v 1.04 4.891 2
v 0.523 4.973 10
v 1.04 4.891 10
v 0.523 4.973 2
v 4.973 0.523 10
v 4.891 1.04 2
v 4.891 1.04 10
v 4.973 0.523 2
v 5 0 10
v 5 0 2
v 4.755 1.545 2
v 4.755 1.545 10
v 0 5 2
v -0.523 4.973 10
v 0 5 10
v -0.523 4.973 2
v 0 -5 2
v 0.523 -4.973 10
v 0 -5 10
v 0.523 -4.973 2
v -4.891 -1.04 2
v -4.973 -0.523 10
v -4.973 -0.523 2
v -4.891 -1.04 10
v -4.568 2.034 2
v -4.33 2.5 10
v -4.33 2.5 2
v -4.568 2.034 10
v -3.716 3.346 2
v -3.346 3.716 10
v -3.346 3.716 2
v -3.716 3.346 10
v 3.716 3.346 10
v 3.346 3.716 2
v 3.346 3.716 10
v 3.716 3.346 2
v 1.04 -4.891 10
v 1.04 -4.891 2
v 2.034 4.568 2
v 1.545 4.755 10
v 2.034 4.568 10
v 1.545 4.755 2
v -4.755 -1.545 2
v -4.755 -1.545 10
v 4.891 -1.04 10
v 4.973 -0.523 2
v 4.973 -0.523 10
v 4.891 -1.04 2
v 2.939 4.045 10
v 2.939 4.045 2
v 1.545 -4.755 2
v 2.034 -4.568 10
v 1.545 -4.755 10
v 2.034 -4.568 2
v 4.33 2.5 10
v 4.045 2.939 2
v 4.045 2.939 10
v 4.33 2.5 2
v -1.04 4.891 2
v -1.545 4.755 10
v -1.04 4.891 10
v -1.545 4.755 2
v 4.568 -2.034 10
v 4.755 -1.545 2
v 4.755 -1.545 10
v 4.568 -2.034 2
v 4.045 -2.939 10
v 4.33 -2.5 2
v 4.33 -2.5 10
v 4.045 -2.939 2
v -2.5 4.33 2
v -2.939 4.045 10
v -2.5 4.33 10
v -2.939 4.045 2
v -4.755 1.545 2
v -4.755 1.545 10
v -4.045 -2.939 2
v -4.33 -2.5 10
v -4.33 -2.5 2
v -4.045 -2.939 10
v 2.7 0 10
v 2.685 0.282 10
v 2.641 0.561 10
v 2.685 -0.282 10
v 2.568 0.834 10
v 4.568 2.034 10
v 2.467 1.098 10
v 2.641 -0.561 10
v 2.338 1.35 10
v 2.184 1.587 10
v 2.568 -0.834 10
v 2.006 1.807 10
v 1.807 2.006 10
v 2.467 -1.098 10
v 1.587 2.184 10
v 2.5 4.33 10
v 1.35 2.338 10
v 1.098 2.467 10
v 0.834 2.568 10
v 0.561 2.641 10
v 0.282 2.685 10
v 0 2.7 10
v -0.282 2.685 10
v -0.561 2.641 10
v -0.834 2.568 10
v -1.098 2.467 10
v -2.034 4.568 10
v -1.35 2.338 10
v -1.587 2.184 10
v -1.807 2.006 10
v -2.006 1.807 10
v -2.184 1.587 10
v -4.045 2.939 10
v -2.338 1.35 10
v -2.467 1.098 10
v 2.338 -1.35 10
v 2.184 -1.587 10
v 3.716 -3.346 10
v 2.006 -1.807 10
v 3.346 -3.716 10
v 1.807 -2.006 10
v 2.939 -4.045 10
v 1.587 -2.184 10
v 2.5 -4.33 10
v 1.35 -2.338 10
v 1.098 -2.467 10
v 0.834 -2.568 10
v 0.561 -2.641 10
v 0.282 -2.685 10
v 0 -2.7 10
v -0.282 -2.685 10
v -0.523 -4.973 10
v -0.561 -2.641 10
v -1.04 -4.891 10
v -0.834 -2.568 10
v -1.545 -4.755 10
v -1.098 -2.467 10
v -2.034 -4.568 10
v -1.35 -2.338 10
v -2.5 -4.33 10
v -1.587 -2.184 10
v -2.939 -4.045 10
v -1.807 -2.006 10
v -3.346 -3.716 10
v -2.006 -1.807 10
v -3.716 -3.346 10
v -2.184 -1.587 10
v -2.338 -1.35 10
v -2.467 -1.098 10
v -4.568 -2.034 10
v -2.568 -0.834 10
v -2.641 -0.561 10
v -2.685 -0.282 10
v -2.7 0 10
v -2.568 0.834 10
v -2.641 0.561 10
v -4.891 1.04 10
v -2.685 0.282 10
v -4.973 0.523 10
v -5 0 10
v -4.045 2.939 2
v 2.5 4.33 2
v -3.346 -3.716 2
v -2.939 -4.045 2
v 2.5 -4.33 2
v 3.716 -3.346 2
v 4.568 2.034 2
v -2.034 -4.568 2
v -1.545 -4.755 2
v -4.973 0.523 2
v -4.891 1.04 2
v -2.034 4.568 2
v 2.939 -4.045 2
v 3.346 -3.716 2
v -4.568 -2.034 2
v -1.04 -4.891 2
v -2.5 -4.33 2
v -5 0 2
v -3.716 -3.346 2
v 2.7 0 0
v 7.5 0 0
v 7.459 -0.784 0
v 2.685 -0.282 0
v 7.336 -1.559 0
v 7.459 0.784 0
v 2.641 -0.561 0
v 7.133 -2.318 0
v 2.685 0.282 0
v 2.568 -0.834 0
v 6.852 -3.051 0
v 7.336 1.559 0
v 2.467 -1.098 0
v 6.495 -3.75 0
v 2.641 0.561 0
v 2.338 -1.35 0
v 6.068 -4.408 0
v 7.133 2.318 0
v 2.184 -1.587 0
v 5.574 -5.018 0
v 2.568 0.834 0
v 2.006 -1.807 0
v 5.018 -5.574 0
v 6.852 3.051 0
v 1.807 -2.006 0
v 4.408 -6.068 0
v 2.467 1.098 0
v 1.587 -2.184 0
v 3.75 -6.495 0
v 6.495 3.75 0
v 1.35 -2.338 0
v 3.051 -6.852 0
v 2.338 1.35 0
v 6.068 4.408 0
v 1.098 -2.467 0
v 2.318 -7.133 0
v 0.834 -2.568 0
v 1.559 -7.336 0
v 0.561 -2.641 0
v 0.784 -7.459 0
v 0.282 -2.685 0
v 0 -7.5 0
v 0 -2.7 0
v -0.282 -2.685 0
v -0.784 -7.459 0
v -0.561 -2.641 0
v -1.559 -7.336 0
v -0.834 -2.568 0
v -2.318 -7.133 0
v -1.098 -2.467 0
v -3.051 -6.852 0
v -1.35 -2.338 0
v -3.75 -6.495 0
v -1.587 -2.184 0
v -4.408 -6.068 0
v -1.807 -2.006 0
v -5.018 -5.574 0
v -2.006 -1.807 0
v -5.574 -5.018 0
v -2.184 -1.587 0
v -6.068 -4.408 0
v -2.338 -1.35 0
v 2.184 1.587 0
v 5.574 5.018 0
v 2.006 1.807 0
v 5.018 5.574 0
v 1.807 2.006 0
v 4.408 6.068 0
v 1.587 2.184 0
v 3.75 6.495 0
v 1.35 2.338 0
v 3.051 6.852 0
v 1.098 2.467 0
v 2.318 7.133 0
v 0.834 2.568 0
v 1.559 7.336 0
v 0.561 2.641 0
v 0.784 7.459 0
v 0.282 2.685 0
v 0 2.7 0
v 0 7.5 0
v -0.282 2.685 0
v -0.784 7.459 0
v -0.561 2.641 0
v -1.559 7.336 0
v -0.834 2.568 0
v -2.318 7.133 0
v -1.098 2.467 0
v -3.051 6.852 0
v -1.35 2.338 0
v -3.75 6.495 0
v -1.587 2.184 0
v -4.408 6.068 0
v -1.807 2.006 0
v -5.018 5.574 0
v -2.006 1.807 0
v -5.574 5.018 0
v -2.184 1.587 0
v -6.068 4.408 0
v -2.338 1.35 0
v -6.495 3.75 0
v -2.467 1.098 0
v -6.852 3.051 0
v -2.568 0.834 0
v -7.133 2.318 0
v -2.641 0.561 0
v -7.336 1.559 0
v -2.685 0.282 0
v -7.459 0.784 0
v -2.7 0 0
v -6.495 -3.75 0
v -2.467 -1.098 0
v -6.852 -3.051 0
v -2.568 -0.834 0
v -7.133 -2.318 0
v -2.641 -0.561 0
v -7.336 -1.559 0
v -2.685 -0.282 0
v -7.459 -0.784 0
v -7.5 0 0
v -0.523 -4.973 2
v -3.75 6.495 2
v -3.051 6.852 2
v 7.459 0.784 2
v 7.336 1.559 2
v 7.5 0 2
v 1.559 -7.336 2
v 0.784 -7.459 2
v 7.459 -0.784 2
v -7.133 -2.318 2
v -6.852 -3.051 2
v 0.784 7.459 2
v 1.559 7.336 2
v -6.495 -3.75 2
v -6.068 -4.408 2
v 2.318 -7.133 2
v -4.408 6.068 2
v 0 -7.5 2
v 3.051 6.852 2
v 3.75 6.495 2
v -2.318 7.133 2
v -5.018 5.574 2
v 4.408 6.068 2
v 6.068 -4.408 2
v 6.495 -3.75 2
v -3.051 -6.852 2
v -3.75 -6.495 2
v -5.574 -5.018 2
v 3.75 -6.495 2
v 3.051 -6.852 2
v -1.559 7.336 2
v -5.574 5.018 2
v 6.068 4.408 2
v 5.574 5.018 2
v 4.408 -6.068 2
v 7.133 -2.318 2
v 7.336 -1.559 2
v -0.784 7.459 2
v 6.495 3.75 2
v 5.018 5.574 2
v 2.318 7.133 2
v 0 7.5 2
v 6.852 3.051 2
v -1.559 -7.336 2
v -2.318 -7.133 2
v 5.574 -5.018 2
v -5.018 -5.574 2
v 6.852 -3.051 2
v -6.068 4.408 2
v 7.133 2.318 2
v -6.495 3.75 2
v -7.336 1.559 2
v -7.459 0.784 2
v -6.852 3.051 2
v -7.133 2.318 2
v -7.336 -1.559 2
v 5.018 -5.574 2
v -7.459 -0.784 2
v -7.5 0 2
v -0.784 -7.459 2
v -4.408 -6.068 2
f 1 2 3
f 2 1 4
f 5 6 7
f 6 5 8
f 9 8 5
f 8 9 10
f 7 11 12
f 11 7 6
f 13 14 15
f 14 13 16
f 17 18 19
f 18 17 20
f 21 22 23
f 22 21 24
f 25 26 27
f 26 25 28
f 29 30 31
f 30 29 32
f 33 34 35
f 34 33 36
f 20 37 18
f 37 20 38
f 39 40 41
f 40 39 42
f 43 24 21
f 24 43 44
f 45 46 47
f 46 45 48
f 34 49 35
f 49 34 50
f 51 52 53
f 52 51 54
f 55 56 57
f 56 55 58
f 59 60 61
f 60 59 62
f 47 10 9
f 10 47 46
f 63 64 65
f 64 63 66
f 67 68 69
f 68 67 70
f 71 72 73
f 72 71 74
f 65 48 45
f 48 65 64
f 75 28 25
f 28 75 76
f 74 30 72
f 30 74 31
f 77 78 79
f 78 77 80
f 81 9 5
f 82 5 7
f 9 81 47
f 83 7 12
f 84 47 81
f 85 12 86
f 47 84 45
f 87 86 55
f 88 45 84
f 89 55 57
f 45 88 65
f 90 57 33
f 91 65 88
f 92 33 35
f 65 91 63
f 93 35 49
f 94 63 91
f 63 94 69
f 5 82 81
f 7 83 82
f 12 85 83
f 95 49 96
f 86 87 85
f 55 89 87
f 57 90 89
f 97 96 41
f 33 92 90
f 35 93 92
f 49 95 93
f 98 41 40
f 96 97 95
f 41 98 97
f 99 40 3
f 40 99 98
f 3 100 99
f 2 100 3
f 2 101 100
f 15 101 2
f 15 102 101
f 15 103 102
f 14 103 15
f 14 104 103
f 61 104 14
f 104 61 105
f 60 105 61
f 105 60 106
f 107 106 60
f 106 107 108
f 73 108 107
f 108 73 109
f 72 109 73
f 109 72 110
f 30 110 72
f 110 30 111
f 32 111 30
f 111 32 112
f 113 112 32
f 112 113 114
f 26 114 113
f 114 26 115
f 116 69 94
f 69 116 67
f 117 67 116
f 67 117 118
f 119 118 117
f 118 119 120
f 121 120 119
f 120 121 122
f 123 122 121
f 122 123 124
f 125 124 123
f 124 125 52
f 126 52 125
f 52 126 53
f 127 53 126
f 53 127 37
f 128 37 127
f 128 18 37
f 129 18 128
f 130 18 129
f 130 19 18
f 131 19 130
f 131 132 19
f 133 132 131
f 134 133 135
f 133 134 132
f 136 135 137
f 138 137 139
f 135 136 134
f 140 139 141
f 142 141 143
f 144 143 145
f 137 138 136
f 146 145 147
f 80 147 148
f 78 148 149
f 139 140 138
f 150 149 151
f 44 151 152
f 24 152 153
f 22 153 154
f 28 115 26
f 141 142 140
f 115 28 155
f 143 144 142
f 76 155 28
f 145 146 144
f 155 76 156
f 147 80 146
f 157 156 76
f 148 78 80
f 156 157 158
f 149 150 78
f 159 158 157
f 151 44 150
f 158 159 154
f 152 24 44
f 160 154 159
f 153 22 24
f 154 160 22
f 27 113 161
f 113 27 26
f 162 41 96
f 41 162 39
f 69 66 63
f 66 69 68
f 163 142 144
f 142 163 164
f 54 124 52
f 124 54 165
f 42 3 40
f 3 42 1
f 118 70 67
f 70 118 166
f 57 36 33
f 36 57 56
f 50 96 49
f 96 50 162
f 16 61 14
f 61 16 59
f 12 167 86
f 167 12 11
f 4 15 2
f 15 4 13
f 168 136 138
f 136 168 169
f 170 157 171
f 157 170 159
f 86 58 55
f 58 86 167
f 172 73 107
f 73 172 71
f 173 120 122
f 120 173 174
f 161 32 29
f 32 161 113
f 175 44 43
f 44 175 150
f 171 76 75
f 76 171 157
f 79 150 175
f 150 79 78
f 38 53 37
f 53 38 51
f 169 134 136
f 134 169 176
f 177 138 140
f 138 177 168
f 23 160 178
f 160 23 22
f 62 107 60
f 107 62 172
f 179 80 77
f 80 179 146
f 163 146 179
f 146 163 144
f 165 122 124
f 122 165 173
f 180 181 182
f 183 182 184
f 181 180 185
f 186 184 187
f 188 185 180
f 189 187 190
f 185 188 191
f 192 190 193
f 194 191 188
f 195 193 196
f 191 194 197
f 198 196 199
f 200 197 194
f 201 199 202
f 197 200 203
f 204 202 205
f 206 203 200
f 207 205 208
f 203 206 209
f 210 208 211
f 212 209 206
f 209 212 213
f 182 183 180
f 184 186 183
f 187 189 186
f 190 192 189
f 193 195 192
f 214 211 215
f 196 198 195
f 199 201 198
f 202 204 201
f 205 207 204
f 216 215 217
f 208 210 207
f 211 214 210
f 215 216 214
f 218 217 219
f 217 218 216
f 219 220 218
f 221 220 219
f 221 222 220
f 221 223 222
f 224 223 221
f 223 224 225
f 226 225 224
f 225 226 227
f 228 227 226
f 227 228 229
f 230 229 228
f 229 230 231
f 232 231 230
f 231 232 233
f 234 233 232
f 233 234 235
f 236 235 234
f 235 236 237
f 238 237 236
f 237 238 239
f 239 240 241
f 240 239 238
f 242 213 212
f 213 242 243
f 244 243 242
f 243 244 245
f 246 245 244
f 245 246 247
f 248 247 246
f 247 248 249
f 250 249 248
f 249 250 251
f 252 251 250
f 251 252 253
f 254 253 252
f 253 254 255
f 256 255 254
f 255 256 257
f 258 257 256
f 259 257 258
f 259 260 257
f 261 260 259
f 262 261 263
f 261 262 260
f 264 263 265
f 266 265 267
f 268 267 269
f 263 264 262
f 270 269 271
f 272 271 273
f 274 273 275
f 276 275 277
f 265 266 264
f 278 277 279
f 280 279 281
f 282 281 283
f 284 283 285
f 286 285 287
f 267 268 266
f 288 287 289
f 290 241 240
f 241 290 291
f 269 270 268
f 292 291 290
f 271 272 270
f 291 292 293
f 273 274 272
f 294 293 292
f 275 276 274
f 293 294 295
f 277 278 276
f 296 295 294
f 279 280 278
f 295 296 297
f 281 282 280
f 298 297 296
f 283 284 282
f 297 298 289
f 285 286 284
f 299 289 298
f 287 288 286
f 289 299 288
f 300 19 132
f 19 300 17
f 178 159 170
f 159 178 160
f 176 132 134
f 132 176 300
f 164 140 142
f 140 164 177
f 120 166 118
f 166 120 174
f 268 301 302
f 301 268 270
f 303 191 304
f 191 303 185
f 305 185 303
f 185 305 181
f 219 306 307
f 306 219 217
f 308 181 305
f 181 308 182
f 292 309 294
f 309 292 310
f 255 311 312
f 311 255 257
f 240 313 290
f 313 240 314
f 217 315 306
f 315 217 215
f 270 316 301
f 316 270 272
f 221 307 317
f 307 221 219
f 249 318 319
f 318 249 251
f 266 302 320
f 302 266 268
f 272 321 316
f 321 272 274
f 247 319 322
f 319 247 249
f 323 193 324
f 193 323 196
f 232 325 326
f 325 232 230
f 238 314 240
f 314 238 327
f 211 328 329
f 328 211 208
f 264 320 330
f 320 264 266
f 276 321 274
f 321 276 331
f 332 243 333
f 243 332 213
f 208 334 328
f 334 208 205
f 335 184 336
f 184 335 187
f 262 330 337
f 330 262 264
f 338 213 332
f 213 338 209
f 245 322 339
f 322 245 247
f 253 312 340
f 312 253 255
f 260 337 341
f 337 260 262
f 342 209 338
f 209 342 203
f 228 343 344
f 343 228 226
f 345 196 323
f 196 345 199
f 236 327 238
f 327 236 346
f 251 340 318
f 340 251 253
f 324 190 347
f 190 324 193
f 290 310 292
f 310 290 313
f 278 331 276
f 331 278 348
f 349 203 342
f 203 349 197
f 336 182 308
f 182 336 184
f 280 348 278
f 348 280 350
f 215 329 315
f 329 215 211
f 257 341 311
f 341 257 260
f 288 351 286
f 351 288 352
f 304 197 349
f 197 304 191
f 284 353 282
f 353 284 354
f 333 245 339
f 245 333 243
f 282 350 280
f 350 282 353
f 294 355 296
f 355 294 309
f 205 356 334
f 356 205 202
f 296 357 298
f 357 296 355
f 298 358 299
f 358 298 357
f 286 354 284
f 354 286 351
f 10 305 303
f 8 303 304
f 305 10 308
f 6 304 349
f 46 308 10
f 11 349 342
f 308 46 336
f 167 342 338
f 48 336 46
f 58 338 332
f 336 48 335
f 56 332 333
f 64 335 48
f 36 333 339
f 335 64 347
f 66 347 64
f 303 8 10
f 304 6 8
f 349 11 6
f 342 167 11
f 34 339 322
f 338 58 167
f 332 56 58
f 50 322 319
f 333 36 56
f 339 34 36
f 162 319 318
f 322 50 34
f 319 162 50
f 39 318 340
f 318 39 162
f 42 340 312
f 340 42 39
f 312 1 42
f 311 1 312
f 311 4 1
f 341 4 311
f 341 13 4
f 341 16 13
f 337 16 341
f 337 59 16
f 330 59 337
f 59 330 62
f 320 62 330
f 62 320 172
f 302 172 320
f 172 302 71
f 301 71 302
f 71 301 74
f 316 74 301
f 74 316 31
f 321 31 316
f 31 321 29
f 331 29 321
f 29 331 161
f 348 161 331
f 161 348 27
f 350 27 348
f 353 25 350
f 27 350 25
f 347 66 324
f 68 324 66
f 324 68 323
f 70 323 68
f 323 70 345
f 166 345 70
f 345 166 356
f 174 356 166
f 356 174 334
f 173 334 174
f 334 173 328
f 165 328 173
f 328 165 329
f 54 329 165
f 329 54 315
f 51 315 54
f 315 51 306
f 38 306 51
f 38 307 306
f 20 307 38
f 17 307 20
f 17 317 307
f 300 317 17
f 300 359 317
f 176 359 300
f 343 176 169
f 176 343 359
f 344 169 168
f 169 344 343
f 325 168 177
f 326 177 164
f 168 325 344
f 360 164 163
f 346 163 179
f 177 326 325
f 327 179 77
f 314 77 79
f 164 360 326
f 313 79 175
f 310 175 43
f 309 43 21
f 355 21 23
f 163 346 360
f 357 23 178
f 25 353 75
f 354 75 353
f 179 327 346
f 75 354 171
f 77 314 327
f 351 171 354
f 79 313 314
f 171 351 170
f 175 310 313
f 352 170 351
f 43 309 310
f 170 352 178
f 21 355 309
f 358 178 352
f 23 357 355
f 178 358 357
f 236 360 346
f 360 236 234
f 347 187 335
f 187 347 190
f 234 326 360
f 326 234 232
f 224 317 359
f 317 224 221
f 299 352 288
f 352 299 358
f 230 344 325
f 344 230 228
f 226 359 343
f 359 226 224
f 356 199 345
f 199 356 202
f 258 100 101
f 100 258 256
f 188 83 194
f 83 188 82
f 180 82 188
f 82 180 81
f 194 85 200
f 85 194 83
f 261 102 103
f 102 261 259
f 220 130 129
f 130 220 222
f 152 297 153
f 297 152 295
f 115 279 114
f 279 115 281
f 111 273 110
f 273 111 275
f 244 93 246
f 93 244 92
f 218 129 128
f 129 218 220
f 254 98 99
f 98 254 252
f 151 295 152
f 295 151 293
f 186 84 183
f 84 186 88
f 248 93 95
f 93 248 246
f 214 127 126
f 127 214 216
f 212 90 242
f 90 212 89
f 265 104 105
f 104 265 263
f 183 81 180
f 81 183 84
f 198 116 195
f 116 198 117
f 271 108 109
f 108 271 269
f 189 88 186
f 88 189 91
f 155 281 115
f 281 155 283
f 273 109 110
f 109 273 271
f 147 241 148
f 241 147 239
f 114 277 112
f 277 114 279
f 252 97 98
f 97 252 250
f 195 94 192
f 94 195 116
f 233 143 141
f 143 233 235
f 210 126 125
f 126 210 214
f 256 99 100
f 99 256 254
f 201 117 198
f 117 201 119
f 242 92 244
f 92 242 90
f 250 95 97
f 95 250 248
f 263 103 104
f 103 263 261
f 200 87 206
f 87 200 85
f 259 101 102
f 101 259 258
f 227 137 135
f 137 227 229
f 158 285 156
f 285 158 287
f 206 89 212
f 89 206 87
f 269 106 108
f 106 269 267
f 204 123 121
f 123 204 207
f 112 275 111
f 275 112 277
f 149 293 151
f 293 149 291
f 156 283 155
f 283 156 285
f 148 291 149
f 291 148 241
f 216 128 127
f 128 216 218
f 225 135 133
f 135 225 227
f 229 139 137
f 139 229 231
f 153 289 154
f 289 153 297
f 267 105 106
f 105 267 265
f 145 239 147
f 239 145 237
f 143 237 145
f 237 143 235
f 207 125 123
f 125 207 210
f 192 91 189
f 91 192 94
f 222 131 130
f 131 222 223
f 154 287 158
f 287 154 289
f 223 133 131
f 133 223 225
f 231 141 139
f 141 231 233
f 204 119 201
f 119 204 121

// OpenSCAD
// Flanged threaded insert.
$fn = 60;
eps = 0.02;
inner_d = 5.4;
outer_d = 10;
length = 10;
flange_d = 15;
difference() {
    union() { cylinder(d=outer_d,h=length); cylinder(d=flange_d,h=2); }
    translate([0,0,-eps]) cylinder(d=inner_d,h=length+2*eps);
}
